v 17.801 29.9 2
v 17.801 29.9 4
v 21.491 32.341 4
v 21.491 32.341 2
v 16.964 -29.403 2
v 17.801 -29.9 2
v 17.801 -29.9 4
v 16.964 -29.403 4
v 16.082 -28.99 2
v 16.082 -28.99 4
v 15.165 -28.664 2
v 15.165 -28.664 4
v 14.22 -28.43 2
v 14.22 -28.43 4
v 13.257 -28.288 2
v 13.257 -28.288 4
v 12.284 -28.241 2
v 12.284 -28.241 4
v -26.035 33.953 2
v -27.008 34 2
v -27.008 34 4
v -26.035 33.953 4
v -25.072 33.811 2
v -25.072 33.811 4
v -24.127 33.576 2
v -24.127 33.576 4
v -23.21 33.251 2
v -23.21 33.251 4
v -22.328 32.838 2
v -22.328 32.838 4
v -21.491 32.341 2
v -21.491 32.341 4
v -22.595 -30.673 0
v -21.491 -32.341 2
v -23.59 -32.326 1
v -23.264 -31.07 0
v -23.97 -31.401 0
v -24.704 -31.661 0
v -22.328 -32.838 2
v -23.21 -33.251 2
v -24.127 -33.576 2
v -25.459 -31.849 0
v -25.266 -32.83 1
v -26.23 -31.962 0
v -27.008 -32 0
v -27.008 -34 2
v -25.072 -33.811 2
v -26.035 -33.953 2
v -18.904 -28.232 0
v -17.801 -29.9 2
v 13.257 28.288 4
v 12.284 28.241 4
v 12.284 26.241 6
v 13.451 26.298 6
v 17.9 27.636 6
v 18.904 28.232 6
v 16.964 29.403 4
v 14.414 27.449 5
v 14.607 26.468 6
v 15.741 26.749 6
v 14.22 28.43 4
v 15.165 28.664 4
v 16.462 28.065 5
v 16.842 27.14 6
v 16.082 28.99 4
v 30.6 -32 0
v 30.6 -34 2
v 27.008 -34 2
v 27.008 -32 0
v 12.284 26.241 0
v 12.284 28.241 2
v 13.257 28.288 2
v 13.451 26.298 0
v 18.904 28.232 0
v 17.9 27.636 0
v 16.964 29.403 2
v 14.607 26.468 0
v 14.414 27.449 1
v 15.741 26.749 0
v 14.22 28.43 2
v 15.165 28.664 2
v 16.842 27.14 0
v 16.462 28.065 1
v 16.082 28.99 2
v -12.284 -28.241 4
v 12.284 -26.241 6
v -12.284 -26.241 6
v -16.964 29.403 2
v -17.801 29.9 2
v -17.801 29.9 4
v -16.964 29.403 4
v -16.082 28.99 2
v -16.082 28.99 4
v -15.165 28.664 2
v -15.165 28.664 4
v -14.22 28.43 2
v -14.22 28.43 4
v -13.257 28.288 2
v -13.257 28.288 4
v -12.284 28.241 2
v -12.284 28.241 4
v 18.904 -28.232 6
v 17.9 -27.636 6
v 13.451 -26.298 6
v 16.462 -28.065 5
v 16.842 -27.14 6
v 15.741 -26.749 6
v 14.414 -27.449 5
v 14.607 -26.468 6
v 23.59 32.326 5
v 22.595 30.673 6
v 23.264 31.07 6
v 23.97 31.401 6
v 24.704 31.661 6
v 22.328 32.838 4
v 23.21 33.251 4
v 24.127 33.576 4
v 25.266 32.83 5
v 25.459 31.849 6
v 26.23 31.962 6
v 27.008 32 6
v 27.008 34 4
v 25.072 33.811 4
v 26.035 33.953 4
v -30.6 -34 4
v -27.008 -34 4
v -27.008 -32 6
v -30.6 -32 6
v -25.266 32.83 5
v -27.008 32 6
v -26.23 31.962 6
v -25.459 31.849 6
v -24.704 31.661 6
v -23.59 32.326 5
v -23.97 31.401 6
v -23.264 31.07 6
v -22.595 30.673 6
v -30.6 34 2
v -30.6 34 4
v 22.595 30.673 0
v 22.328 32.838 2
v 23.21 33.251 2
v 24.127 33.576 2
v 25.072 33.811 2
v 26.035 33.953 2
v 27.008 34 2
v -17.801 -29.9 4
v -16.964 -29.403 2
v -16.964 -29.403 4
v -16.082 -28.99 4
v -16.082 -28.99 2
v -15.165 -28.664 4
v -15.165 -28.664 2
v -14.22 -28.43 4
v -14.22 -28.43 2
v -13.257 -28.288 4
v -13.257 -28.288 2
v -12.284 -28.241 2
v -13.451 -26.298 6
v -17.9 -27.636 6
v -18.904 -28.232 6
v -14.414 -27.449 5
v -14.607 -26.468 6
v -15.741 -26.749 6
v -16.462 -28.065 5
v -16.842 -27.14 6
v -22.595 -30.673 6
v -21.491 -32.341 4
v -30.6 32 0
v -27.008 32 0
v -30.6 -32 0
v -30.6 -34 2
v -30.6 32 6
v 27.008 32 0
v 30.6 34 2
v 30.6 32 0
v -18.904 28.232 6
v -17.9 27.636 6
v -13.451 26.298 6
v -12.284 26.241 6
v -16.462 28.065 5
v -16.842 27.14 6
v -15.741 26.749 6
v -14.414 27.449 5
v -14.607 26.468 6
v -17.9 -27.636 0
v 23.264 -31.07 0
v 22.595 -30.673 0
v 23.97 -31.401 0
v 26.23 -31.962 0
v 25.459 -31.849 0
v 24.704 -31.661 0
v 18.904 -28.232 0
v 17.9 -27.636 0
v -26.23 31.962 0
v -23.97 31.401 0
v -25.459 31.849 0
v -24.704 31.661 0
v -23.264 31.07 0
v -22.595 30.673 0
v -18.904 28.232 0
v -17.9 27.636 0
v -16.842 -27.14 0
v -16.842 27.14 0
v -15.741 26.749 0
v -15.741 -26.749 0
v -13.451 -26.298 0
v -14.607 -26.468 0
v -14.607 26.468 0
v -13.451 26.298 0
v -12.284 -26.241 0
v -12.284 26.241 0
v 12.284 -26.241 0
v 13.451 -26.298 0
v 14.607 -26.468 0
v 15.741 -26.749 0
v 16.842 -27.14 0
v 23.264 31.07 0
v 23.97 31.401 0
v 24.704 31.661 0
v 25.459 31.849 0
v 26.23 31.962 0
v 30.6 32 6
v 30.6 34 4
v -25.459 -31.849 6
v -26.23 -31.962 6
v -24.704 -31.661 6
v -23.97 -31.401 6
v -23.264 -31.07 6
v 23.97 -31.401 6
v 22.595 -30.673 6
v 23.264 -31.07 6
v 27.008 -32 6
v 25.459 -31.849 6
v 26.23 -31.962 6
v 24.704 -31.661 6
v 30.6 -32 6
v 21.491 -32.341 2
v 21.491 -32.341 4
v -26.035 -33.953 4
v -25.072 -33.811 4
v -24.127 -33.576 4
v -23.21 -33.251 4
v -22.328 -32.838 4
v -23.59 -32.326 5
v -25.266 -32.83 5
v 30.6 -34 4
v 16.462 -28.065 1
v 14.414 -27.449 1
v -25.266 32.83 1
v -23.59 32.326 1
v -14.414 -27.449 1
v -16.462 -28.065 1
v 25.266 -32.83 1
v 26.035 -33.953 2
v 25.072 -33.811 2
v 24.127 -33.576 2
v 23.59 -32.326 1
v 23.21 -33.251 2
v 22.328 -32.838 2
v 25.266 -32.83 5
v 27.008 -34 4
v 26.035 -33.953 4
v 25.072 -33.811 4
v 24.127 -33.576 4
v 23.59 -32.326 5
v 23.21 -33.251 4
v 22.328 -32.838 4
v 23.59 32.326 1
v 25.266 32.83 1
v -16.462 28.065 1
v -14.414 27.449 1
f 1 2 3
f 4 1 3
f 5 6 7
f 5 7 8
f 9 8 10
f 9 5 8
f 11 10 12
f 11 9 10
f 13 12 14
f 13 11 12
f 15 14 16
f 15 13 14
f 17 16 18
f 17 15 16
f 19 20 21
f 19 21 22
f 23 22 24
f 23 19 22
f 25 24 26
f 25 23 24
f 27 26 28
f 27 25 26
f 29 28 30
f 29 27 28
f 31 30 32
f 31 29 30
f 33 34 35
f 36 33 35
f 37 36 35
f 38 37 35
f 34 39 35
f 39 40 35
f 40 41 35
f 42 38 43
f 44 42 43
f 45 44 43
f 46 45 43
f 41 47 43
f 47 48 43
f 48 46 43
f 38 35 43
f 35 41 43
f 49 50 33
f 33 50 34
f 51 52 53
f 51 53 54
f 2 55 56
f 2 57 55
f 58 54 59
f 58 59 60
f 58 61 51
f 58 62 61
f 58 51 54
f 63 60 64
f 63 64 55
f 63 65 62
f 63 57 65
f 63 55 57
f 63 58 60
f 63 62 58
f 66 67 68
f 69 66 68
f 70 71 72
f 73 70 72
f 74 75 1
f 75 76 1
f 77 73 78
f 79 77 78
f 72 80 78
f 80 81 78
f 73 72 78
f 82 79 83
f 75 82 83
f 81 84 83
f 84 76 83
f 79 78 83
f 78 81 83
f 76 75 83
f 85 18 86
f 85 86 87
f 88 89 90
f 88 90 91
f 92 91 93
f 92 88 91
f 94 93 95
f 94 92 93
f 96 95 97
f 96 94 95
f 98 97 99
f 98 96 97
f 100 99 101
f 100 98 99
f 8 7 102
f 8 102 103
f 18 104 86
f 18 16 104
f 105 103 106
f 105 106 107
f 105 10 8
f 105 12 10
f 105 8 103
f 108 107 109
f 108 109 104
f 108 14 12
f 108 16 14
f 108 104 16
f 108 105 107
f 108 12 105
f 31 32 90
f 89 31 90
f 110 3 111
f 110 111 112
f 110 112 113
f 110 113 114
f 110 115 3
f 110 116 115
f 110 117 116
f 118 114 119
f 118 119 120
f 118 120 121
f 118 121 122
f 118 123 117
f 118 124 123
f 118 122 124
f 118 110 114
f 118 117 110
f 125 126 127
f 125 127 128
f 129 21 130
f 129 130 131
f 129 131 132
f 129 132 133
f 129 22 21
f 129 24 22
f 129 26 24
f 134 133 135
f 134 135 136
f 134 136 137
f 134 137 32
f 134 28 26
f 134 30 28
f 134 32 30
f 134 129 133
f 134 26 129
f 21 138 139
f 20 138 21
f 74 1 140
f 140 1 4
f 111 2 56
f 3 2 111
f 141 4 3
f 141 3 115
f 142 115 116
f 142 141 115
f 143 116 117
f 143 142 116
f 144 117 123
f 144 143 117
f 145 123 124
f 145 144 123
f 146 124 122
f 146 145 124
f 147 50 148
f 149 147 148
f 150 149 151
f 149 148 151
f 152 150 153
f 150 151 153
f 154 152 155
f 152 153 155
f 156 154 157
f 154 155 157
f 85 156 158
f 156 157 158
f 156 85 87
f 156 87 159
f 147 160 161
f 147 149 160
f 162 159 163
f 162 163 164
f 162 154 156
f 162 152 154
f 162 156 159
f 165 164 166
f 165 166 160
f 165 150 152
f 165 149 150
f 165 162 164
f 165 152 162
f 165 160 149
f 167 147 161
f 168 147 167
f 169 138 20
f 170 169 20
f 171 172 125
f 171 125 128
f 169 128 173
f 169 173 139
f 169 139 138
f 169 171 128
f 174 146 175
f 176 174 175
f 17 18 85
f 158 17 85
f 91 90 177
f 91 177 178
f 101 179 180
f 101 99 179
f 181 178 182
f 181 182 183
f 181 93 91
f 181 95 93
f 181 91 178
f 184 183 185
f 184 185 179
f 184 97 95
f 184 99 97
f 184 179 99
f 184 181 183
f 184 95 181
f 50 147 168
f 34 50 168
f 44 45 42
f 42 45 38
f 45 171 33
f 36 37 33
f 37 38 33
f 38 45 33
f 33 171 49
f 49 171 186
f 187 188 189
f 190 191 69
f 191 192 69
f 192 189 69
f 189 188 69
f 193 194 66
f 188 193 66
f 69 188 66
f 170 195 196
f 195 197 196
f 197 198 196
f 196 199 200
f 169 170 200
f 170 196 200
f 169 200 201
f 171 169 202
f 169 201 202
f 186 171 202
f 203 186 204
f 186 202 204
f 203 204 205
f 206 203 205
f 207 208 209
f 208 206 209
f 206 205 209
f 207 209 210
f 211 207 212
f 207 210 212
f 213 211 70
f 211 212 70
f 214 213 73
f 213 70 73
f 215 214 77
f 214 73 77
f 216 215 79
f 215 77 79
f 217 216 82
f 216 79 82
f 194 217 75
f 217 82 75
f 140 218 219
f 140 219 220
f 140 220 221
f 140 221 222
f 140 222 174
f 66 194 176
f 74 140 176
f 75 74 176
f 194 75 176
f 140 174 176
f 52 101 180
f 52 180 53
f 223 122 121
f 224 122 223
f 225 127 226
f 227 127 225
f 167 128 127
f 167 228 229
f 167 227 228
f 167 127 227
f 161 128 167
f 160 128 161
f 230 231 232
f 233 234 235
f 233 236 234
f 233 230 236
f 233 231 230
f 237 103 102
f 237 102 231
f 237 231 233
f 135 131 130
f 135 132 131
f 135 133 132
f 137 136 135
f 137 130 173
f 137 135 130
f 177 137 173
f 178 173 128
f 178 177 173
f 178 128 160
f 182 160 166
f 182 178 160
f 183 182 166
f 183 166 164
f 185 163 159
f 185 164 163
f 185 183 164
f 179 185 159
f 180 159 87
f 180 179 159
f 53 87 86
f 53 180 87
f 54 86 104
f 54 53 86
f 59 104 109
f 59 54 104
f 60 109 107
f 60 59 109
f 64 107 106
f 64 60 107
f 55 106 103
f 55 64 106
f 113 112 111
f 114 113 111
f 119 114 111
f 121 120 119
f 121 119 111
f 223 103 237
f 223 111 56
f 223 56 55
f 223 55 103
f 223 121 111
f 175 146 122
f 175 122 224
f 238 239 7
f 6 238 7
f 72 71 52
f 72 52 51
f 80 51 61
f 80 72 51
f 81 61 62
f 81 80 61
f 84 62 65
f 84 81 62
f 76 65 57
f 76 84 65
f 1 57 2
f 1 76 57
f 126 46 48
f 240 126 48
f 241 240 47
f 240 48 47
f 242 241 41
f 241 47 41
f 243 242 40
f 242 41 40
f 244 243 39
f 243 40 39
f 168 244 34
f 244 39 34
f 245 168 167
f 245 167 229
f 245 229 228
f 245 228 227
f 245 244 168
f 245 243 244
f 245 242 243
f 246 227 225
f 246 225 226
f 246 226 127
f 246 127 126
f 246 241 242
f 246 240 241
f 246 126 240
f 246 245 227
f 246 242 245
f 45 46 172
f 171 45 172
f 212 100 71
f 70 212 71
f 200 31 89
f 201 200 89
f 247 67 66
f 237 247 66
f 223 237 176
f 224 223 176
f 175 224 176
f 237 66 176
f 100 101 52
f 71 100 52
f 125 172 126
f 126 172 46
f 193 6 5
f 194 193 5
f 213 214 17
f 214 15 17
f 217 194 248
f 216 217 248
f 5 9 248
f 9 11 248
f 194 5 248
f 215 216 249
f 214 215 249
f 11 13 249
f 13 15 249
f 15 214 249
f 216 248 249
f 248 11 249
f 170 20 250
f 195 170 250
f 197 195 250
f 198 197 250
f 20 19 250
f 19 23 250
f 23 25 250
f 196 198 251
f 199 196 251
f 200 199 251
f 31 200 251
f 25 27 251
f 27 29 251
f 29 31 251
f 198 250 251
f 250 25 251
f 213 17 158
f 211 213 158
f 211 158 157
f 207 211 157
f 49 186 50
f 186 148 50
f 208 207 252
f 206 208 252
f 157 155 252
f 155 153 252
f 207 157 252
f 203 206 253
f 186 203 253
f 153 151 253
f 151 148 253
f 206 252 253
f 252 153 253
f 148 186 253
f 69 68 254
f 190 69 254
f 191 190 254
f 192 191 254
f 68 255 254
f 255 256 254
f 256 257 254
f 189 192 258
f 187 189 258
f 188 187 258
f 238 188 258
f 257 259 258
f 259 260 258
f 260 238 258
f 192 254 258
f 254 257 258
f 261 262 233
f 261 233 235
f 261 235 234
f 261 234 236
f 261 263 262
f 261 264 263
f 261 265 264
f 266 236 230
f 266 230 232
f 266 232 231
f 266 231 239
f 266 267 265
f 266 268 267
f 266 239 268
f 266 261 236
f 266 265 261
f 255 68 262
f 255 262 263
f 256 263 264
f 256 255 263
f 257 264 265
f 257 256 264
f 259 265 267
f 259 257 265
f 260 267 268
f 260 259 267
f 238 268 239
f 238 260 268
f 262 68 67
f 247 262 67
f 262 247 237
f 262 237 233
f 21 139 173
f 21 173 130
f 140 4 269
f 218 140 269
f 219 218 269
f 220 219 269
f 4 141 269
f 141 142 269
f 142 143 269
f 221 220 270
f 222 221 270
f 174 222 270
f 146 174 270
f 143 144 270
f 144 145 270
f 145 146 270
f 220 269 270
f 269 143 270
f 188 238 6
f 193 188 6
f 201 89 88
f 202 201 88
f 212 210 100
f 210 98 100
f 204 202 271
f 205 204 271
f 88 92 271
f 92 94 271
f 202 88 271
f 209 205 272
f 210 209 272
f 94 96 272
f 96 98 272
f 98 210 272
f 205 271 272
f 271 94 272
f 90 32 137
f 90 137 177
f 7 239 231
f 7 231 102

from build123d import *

# Parameters (mm, degrees)
CROQUIS1_W              = 61.2
CROQUIS1_H              = 68
SALIENTE_EXTRUIR1_DEPTH = 6
CORTAR_EXTRUIR1_DEPTH   = 47.134152209
REDONDEO1_R             = 10
CHAFL_N1_SIZE           = 2


with BuildPart() as part:
    # Croquis1 → Saliente-Extruir1 (new body)
    with BuildSketch(Plane.XY):
        Rectangle(CROQUIS1_W, CROQUIS1_H)
    extrude(amount=SALIENTE_EXTRUIR1_DEPTH)

    # Croquis2 → Cortar-Extruir1 (cut, through all)
    with BuildSketch(Plane.XY.offset(6)):
        Polygon((-24, 34), (-15.292264831, 28.240639048), (15.292264831, 28.240639048), (24, 34), align=None)
        Polygon((24, -34), (15.292264831, -28.240639048), (-15.292264831, -28.240639048), (-24, -34), align=None)
    extrude(amount=-CORTAR_EXTRUIR1_DEPTH, mode=Mode.SUBTRACT)

    # Redondeo1
    redondeo1_edges = [part.edges().sort_by_distance(p)[0] for p in [
        (-24, 34, 3),
        (24, 34, 3),
        (15.292264831, 28.240639048, 3),
        (-15.292264831, 28.240639048, 3),
        (24, -34, 3),
        (-24, -34, 3),
        (-15.292264831, -28.240639048, 3),
        (15.292264831, -28.240639048, 3),
    ]]
    fillet(redondeo1_edges, radius=REDONDEO1_R)

    # Chaflán1
    chafl_n1_edges = [part.edges().sort_by_distance(p)[0] for p in [
        (28.803922608, 34, 6),
        (19.646132416, -31.120319524, 6),
        (19.646132416, -31.120319524, 0),
        (19.646132416, 31.120319524, 6),
        (0, 28.240639048, 6),
        (28.803922608, 34, 0),
        (-19.646132416, 31.120319524, 6),
        (-28.803922608, 34, 6),
        (-19.646132416, -31.120319524, 6),
        (0, -28.240639048, 6),
        (28.803922608, -34, 6),
        (-24.127474692, 33.576192648, 6),
        (24.127474692, 33.576192648, 6),
        (-24.127474692, -33.576192648, 6),
        (24.127474692, -33.576192648, 6),
        (28.803922608, -34, 0),
        (0, 28.240639048, 0),
        (19.646132416, 31.120319524, 0),
        (0, -28.240639048, 0),
        (-28.803922608, -34, 0),
        (-19.646132416, -31.120319524, 0),
        (-28.803922608, 34, 0),
        (-19.646132416, 31.120319524, 0),
        (-24.127474692, 33.576192648, 0),
        (24.127474692, 33.576192648, 0),
        (-24.127474692, -33.576192648, 0),
        (24.127474692, -33.576192648, 0),
        (15.164790139, -28.6644464, 6),
        (15.164790139, -28.6644464, 0),
        (-15.164790139, -28.6644464, 6),
        (-15.164790139, -28.6644464, 0),
        (15.164790139, 28.6644464, 6),
        (15.164790139, 28.6644464, 0),
        (-15.164790139, 28.6644464, 6),
        (-15.164790139, 28.6644464, 0),
        (-28.803922608, -34, 6),
    ]]
    chamfer(chafl_n1_edges, length=CHAFL_N1_SIZE)


solid = part.part
